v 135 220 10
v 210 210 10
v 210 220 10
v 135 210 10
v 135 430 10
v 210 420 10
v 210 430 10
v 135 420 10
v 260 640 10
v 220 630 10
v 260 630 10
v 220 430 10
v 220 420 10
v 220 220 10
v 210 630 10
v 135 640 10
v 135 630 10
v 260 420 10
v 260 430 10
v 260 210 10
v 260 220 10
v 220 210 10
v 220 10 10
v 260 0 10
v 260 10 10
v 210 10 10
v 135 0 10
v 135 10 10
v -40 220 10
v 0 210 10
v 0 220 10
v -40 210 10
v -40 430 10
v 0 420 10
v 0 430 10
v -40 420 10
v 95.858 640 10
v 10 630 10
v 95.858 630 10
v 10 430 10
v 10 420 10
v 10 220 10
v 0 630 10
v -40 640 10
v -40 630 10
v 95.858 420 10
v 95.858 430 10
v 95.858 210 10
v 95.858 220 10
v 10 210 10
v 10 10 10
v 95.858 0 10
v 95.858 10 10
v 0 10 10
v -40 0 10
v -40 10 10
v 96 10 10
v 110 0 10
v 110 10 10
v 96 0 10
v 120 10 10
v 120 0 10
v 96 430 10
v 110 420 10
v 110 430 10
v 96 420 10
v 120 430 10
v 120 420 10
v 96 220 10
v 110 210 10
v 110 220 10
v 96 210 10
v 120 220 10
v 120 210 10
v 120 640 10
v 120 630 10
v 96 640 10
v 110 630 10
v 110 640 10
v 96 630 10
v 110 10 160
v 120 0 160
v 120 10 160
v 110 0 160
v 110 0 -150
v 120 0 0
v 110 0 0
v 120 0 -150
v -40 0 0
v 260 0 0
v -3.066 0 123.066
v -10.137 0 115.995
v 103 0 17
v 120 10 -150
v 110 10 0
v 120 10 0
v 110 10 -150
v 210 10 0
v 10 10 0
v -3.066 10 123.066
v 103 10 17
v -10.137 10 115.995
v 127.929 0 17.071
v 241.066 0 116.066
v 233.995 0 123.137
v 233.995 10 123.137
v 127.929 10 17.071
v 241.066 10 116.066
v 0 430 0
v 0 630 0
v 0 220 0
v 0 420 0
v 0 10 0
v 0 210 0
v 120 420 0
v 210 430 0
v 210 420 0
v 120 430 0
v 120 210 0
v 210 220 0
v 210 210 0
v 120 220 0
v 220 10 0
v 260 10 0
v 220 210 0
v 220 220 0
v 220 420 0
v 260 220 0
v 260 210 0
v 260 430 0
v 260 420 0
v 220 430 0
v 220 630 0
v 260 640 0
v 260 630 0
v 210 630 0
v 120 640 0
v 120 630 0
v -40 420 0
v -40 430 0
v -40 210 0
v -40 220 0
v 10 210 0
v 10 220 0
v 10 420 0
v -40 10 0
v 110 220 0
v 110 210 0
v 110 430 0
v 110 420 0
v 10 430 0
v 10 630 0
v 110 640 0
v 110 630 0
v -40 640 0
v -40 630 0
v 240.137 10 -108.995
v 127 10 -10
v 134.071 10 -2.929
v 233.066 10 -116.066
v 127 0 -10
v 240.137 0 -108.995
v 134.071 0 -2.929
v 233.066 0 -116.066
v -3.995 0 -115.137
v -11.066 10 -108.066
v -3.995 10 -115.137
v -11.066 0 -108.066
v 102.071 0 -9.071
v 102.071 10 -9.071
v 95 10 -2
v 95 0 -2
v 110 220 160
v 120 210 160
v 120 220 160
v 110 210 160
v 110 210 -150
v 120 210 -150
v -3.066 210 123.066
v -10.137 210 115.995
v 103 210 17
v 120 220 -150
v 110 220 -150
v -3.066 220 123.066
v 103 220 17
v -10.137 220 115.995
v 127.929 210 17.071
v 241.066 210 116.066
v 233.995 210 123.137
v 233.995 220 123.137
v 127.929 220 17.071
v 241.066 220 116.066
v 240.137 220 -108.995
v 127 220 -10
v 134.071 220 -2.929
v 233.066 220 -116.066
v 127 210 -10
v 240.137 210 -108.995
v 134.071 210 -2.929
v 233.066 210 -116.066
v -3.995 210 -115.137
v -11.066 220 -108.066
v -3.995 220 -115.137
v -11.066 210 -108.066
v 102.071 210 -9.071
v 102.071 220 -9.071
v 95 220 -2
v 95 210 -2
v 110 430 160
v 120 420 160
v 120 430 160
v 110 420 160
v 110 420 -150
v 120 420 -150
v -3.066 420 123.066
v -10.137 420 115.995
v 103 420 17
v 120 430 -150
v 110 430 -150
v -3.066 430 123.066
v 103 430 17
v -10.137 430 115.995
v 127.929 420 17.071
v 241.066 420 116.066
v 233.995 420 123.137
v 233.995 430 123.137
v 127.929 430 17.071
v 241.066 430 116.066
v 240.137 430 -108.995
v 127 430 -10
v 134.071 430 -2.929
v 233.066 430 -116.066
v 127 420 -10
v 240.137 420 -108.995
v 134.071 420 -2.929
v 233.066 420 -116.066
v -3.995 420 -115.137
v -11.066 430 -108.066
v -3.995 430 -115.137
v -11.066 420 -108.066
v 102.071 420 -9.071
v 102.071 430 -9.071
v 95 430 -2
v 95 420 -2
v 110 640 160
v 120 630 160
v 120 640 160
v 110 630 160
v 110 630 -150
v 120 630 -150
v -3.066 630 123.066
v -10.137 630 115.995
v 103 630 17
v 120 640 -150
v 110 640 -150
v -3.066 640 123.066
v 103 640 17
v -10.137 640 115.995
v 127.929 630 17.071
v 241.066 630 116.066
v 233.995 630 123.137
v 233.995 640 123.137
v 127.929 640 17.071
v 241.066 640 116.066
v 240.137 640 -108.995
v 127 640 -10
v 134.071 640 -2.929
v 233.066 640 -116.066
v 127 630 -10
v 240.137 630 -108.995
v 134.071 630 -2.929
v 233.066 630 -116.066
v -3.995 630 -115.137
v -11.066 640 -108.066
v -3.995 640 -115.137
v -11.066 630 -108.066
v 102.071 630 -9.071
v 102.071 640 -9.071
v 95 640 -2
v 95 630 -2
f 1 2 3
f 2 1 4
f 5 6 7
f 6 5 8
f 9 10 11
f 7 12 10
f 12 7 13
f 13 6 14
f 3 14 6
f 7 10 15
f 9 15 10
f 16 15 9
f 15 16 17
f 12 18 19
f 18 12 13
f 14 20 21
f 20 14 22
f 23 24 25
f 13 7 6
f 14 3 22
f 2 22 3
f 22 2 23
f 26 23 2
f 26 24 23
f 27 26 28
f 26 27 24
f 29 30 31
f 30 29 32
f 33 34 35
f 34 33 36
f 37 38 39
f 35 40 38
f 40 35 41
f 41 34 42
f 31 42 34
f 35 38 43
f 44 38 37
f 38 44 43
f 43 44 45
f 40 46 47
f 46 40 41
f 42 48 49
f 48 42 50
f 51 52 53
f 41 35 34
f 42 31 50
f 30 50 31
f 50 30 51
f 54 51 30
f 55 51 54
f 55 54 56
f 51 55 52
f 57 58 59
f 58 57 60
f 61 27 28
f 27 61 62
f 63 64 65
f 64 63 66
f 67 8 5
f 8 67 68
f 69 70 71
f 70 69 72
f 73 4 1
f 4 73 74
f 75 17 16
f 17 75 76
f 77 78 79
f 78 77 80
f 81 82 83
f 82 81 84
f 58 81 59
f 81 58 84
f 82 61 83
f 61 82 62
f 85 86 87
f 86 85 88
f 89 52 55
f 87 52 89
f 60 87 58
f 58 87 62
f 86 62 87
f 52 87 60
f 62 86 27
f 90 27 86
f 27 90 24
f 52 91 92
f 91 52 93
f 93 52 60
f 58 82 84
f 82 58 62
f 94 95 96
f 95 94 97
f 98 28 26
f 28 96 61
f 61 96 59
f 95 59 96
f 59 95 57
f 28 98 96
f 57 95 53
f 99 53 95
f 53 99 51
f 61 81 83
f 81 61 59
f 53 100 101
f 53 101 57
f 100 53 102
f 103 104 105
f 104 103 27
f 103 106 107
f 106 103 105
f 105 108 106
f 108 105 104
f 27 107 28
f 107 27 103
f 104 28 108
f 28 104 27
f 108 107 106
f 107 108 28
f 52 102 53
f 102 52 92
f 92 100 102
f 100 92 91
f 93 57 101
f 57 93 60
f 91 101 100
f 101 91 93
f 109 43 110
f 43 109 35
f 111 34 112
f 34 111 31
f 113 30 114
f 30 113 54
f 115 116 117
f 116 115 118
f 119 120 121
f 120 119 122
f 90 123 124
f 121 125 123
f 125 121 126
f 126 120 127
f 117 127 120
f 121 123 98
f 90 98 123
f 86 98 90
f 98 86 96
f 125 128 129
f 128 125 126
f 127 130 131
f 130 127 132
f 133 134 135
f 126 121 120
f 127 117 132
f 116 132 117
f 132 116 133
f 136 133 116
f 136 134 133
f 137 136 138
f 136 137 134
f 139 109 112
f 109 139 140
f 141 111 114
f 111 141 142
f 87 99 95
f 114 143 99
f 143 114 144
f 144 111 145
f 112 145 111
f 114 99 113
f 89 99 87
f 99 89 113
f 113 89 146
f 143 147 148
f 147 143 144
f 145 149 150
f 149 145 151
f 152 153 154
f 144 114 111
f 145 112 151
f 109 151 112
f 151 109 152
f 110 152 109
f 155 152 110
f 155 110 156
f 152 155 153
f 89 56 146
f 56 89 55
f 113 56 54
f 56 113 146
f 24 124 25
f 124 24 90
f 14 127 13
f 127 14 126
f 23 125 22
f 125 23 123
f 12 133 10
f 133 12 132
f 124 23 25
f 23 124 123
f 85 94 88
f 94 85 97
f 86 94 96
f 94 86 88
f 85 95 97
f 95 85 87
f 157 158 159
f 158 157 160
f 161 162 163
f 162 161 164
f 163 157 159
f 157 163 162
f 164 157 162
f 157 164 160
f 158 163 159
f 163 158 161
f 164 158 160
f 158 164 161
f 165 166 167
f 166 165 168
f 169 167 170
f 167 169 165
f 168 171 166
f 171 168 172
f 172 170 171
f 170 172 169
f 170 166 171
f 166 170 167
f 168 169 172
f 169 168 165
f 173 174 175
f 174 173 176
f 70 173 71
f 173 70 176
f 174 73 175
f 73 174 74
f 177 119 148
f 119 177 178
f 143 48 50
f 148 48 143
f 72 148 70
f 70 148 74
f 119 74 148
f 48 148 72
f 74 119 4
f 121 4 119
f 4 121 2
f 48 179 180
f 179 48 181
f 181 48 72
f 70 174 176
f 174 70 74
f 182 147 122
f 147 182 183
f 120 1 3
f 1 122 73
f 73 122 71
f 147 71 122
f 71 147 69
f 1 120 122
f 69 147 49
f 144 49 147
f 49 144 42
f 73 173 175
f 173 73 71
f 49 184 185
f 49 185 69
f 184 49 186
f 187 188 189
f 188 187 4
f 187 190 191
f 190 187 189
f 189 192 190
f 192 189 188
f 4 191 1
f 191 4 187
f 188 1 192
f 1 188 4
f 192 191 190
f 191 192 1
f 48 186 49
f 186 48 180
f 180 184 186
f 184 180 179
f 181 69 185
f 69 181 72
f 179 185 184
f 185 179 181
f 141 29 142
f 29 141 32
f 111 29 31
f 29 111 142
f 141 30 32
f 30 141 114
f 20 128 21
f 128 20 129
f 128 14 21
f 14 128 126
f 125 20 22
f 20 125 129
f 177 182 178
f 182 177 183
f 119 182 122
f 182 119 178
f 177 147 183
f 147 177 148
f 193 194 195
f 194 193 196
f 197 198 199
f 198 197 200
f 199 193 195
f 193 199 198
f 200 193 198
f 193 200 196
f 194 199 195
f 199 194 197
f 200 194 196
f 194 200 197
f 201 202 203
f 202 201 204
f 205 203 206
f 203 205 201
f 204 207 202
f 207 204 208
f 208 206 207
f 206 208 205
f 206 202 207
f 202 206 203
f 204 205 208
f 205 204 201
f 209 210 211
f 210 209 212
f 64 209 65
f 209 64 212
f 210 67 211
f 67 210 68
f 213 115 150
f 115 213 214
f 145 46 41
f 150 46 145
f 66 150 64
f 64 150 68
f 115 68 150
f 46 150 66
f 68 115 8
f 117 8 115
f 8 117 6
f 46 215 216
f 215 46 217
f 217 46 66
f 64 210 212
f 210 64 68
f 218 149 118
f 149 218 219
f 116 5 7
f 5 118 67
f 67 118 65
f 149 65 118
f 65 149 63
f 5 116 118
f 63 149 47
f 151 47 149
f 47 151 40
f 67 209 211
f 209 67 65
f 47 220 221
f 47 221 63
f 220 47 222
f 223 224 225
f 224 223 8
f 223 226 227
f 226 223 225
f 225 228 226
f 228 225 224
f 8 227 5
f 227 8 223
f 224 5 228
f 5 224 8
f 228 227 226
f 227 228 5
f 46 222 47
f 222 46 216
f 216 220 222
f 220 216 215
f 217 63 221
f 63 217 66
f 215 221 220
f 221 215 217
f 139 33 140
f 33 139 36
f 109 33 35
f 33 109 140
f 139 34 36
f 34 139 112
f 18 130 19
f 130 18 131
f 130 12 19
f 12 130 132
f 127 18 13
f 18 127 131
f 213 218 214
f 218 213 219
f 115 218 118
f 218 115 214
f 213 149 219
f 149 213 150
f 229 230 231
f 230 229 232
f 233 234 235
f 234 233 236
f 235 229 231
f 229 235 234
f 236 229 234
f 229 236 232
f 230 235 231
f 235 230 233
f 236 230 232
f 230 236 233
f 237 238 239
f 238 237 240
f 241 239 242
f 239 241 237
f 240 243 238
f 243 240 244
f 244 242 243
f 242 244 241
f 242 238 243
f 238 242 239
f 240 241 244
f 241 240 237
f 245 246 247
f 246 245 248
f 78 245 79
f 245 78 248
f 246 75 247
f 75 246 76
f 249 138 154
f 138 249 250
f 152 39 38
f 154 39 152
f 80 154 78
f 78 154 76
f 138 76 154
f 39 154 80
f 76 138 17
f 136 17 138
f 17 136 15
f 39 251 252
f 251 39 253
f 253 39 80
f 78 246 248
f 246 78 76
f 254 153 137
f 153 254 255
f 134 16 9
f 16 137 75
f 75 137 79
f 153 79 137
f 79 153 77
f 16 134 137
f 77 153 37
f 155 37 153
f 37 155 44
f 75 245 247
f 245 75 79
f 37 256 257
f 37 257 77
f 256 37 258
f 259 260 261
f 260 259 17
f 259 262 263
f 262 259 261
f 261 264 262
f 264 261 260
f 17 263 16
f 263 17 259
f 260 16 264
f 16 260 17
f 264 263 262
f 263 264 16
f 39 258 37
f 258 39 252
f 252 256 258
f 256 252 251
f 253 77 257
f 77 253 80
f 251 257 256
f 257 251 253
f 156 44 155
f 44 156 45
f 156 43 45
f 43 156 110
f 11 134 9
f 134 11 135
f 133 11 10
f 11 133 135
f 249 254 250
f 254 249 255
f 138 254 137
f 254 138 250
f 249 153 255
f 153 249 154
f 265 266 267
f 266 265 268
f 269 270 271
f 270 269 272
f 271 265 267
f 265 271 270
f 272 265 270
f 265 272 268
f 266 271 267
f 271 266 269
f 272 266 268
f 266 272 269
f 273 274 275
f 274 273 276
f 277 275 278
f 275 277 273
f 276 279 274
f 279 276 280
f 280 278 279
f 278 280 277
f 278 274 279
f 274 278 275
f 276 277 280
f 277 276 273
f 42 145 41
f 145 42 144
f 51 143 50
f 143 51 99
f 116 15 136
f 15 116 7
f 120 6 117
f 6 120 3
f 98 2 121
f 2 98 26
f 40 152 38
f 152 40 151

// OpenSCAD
module edge()
{
cube([10,10,10]);
}

module bar(length)
{
color([0,0,length/255],1.0)
cube([length,10,10]);
}

edge();
translate([10,0,0])
bar(200);
translate([210,0,0])
edge();

translate([10,10,0])
rotate([0,0,90])
bar(200);
translate([220,10,0])
rotate([0,0,90])
bar(200);

translate([0,210,0])
edge();
translate([10,210,0])
bar(200);
translate([210,210,0])
edge();

translate([10,220,0])
rotate([0,0,90])
bar(200);
translate([220,220,0])
rotate([0,0,90])
bar(200);

translate([0,420,0])
edge();
translate([10,420,0])
bar(200);
translate([210,420,0])
edge();

translate([10,430,0])
rotate([0,0,90])
bar(200);
translate([220,430,0])
rotate([0,0,90])
bar(200);

translate([0,630,0])
edge();
translate([10,630,0])
bar(200);
translate([210,630,0])
edge();

for (y = [0, 210, 420, 630])
{
translate([120,y,10])
rotate([0,-90,0])
bar(150);
translate([135,y,10])
rotate([0,-45,0])
bar(150);
translate([103,y,17])
rotate([0,-135,0])
bar(150);
translate([-40,y,0])
bar(40);
translate([220,y,0])
bar(40);
translate([110,y,0])
rotate([0,90,0])
bar(150);
translate([127,y,-10])
rotate([0,45,0])
bar(150);
translate([95,y,-2])
rotate([0,135,0])
bar(150);
}
